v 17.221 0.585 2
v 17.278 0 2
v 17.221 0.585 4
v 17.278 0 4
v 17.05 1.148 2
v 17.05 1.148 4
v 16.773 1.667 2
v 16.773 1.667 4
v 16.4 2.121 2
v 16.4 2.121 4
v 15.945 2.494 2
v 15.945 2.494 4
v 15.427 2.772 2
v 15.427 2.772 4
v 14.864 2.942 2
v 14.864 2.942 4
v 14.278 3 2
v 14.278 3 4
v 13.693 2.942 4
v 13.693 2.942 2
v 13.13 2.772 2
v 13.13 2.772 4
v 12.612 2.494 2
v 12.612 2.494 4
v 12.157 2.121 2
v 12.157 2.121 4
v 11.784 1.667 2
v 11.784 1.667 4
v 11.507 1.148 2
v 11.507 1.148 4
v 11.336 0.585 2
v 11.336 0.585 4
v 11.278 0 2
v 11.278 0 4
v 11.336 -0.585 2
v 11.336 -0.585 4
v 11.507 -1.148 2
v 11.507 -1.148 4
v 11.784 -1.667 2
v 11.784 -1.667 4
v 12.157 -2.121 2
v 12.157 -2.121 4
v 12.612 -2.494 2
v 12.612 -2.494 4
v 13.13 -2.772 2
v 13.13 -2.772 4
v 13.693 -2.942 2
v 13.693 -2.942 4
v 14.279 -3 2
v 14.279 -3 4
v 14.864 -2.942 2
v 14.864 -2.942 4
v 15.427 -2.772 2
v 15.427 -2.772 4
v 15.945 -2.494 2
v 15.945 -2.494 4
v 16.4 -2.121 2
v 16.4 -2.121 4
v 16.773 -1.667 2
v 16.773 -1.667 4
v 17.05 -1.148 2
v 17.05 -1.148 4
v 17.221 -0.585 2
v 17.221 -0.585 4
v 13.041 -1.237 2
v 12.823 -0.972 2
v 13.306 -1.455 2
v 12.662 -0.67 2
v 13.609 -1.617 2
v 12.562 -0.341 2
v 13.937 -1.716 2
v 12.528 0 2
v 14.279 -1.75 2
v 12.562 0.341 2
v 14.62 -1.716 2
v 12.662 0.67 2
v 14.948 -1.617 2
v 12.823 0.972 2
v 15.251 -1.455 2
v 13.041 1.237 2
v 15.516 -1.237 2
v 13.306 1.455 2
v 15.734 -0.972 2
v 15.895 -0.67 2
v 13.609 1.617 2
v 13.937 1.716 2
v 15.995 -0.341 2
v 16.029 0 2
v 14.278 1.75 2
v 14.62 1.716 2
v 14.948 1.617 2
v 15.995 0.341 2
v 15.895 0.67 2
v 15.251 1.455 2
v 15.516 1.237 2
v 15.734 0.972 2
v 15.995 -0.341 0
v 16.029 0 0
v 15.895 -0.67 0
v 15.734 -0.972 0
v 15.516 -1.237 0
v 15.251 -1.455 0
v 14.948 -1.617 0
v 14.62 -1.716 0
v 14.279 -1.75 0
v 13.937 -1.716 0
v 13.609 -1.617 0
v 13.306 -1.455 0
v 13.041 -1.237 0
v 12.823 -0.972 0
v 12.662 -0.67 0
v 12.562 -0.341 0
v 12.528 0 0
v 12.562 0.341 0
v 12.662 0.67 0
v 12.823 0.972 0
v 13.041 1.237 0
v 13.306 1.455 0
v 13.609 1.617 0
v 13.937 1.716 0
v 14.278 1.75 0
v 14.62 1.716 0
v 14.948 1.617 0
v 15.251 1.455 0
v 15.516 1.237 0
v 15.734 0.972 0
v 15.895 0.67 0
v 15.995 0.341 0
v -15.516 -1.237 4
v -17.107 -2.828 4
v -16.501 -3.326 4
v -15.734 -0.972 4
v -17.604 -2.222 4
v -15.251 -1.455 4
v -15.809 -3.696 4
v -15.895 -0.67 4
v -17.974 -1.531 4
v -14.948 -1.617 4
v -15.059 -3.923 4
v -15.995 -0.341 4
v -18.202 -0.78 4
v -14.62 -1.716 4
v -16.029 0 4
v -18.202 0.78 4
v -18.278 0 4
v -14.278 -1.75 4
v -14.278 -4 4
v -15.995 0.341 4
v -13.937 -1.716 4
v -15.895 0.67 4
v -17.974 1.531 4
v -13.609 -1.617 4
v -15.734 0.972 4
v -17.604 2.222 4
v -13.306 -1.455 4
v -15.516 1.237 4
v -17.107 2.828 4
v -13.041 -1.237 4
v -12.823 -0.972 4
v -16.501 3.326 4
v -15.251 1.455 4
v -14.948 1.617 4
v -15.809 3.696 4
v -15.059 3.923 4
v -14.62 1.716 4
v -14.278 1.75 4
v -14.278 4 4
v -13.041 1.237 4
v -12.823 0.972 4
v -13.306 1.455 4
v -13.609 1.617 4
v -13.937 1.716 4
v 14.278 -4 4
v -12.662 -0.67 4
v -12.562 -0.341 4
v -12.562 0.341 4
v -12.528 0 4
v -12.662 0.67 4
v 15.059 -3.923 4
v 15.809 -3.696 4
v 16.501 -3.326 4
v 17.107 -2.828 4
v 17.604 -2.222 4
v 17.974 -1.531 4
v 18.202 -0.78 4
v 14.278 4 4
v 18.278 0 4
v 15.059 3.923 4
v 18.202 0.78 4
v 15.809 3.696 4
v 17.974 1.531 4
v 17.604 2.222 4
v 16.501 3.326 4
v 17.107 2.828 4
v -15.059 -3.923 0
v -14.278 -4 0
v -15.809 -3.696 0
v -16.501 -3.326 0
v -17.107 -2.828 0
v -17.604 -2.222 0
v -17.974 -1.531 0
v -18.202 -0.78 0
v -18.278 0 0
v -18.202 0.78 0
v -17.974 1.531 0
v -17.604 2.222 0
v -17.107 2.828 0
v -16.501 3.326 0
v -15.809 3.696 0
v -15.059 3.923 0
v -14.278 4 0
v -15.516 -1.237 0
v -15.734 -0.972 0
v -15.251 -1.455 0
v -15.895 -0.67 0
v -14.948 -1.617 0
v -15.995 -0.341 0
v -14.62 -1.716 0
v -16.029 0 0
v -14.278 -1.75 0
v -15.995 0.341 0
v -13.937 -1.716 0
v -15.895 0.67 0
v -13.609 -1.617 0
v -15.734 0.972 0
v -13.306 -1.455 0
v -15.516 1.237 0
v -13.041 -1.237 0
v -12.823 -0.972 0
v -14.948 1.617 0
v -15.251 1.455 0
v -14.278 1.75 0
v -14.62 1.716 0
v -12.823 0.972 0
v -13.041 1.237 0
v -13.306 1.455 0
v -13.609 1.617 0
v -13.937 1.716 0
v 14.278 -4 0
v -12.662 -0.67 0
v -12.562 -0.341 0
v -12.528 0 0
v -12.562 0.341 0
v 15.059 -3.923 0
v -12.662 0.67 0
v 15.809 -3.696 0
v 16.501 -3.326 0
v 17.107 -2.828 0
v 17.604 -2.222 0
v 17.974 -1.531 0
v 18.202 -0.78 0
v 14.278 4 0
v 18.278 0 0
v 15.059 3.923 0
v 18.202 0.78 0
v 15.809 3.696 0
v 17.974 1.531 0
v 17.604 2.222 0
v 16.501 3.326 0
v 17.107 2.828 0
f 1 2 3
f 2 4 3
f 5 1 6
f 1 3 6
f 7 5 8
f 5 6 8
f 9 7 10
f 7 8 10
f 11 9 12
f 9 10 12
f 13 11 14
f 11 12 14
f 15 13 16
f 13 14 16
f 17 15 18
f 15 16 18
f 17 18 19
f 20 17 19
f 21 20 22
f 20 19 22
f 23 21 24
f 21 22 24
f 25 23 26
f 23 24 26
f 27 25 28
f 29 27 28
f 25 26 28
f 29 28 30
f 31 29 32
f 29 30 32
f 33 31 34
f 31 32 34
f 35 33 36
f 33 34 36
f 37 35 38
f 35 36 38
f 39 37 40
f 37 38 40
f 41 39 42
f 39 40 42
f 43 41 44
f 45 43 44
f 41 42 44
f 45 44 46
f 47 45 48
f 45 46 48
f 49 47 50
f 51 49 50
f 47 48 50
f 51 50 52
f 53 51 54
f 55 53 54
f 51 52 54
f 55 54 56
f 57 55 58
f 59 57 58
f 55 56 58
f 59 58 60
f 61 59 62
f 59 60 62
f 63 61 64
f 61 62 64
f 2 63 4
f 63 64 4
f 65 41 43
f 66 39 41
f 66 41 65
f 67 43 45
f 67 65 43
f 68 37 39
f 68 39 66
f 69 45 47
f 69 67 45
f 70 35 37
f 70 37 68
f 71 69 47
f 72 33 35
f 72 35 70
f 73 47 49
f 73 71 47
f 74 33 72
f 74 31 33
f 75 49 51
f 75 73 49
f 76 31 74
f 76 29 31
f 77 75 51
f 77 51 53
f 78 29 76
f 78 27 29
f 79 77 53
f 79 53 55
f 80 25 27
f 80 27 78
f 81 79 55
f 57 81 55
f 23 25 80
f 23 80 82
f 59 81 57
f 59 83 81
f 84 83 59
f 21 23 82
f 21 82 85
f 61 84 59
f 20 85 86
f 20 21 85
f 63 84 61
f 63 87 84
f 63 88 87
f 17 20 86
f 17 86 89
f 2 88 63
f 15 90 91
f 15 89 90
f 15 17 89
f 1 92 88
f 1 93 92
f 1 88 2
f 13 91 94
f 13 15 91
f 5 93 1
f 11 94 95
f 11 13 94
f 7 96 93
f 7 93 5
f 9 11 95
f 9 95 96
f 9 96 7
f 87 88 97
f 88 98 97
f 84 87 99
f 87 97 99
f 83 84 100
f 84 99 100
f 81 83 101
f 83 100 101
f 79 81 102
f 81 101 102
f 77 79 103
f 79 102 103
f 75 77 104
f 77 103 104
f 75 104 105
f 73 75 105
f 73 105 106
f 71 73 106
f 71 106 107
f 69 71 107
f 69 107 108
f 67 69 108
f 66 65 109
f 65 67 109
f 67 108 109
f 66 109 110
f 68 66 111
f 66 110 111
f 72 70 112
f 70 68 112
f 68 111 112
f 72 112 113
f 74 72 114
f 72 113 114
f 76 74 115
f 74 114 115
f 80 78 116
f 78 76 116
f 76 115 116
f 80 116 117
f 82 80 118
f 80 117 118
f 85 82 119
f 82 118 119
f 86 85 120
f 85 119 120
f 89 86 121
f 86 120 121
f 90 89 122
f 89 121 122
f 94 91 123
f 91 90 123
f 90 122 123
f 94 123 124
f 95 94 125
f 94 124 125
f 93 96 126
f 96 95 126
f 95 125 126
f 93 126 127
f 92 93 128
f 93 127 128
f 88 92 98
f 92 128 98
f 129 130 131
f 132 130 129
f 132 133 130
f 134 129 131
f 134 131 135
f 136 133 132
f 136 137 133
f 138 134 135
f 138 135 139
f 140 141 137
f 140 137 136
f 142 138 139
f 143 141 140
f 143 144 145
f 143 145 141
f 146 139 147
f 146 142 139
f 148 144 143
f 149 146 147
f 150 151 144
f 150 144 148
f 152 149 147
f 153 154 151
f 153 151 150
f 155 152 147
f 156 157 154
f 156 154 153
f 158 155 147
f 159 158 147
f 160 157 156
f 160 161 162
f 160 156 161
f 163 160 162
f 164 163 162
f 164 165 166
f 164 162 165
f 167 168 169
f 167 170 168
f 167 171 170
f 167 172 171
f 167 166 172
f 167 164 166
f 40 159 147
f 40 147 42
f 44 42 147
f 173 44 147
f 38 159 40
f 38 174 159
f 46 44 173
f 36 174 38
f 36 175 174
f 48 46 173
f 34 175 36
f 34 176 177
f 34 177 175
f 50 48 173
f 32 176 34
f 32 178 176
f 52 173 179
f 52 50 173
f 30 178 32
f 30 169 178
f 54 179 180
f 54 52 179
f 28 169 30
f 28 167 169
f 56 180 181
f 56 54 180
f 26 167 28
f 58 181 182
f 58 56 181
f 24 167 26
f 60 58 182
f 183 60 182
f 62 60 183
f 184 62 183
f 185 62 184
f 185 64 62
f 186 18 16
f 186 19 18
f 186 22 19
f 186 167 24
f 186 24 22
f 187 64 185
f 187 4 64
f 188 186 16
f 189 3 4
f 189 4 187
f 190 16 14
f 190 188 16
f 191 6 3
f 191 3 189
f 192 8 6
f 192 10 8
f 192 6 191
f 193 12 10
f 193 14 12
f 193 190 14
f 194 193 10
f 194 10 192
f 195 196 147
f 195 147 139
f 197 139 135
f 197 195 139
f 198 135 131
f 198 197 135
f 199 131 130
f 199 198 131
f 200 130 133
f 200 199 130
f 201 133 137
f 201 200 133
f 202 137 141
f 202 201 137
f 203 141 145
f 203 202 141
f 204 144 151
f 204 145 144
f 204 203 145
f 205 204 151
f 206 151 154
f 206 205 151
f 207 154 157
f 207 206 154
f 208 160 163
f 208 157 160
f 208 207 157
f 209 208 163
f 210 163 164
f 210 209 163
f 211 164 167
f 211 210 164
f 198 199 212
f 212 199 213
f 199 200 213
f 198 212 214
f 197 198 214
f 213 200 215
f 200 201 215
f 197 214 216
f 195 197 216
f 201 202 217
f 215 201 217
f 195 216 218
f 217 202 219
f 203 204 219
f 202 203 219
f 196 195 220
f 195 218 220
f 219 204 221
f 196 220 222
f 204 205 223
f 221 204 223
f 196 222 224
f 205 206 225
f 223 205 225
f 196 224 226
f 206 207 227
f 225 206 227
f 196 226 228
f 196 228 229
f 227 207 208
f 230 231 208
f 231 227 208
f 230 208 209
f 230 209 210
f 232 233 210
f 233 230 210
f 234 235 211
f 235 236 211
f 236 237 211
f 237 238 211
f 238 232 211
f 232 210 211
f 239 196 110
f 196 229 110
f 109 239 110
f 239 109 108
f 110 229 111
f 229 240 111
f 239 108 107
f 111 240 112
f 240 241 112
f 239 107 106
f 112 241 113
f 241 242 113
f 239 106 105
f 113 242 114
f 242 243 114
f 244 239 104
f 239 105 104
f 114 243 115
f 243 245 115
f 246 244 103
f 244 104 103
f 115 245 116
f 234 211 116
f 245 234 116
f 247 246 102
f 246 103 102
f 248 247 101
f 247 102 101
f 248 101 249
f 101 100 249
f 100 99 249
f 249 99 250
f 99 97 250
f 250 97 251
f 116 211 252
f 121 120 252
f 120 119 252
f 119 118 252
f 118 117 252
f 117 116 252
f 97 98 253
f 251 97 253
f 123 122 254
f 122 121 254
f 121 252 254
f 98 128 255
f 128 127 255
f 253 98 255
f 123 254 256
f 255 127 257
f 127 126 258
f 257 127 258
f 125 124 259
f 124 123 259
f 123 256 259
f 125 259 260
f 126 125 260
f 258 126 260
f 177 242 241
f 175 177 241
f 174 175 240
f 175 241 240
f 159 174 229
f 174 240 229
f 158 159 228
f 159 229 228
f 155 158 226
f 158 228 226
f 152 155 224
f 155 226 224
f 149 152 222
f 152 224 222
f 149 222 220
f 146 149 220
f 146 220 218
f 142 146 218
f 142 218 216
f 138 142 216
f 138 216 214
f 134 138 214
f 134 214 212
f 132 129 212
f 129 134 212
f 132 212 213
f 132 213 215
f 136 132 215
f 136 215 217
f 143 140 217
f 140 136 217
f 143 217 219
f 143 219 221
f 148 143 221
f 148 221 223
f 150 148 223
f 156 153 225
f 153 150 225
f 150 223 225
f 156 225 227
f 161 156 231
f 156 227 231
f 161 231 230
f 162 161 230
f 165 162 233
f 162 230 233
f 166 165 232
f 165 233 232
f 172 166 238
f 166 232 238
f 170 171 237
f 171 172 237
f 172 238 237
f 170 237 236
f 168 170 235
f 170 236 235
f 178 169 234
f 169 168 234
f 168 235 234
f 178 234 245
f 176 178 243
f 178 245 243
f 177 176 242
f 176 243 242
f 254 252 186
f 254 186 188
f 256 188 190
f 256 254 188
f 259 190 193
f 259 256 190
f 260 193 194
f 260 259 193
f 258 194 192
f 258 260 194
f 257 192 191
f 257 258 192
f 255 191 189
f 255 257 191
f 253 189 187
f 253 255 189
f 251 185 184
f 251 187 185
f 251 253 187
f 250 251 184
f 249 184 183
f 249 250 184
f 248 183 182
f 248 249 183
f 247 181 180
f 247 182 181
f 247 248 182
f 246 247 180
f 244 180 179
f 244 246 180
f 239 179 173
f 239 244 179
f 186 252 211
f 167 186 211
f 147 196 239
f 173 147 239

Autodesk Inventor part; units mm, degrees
ref_plane "YZ Plane" through (0, 0, 0) normal (1, 0, 0) x (0, 1, 0)
ref_plane "XZ Plane" through (0, 0, 0) normal (0, 1, 0) x (-1, 0, 0)
ref_plane "XY Plane" through (0, 0, 0) normal (0, 0, 1) x (1, 0, 0)
sketch "Sketch1" plane through (0, 0, 0) normal (0, 0, 1) x (1, 0, 0)
  line L0 (-14.2785, 0) -> (14.2785, 0) construction
  line L1 (-14.2785, -4) -> (14.2785, -4)
  line L2 (14.2785, 4) -> (-14.2785, 4)
  arc A0 (-14.2785, 4) -> (-14.2785, -4) centre (-14.2785, 0) ccw
  arc A1 (14.2785, -4) -> (14.2785, 4) centre (14.2785, 0) ccw
  circle A2 centre (-14.2785, 0) radius 1.75
  circle A3 centre (14.2785, 0) radius 1.75
  point P0 (0, 0)
  dimension "d0" = 4
  dimension "d1" = 3.5
  dimension "d2" = 3.5
  dimension "d3" = 28.557
extrude "Extrusion1" add sketch "Sketch1" along normal blind 4
sketch "Sketch2" plane through (0, 0, 4) normal (0, 0, 1) x (1, 0, 0)
  circle A0 centre (14.2785, 0) radius 1.75 projected
  circle A1 centre (14.2785, 0) radius 3
  point P0 (0, 0)
  dimension "d6" = 6
extrude "Extrusion2" cut sketch "Sketch2" against normal blind 2
properties part number "mechanism_2"
